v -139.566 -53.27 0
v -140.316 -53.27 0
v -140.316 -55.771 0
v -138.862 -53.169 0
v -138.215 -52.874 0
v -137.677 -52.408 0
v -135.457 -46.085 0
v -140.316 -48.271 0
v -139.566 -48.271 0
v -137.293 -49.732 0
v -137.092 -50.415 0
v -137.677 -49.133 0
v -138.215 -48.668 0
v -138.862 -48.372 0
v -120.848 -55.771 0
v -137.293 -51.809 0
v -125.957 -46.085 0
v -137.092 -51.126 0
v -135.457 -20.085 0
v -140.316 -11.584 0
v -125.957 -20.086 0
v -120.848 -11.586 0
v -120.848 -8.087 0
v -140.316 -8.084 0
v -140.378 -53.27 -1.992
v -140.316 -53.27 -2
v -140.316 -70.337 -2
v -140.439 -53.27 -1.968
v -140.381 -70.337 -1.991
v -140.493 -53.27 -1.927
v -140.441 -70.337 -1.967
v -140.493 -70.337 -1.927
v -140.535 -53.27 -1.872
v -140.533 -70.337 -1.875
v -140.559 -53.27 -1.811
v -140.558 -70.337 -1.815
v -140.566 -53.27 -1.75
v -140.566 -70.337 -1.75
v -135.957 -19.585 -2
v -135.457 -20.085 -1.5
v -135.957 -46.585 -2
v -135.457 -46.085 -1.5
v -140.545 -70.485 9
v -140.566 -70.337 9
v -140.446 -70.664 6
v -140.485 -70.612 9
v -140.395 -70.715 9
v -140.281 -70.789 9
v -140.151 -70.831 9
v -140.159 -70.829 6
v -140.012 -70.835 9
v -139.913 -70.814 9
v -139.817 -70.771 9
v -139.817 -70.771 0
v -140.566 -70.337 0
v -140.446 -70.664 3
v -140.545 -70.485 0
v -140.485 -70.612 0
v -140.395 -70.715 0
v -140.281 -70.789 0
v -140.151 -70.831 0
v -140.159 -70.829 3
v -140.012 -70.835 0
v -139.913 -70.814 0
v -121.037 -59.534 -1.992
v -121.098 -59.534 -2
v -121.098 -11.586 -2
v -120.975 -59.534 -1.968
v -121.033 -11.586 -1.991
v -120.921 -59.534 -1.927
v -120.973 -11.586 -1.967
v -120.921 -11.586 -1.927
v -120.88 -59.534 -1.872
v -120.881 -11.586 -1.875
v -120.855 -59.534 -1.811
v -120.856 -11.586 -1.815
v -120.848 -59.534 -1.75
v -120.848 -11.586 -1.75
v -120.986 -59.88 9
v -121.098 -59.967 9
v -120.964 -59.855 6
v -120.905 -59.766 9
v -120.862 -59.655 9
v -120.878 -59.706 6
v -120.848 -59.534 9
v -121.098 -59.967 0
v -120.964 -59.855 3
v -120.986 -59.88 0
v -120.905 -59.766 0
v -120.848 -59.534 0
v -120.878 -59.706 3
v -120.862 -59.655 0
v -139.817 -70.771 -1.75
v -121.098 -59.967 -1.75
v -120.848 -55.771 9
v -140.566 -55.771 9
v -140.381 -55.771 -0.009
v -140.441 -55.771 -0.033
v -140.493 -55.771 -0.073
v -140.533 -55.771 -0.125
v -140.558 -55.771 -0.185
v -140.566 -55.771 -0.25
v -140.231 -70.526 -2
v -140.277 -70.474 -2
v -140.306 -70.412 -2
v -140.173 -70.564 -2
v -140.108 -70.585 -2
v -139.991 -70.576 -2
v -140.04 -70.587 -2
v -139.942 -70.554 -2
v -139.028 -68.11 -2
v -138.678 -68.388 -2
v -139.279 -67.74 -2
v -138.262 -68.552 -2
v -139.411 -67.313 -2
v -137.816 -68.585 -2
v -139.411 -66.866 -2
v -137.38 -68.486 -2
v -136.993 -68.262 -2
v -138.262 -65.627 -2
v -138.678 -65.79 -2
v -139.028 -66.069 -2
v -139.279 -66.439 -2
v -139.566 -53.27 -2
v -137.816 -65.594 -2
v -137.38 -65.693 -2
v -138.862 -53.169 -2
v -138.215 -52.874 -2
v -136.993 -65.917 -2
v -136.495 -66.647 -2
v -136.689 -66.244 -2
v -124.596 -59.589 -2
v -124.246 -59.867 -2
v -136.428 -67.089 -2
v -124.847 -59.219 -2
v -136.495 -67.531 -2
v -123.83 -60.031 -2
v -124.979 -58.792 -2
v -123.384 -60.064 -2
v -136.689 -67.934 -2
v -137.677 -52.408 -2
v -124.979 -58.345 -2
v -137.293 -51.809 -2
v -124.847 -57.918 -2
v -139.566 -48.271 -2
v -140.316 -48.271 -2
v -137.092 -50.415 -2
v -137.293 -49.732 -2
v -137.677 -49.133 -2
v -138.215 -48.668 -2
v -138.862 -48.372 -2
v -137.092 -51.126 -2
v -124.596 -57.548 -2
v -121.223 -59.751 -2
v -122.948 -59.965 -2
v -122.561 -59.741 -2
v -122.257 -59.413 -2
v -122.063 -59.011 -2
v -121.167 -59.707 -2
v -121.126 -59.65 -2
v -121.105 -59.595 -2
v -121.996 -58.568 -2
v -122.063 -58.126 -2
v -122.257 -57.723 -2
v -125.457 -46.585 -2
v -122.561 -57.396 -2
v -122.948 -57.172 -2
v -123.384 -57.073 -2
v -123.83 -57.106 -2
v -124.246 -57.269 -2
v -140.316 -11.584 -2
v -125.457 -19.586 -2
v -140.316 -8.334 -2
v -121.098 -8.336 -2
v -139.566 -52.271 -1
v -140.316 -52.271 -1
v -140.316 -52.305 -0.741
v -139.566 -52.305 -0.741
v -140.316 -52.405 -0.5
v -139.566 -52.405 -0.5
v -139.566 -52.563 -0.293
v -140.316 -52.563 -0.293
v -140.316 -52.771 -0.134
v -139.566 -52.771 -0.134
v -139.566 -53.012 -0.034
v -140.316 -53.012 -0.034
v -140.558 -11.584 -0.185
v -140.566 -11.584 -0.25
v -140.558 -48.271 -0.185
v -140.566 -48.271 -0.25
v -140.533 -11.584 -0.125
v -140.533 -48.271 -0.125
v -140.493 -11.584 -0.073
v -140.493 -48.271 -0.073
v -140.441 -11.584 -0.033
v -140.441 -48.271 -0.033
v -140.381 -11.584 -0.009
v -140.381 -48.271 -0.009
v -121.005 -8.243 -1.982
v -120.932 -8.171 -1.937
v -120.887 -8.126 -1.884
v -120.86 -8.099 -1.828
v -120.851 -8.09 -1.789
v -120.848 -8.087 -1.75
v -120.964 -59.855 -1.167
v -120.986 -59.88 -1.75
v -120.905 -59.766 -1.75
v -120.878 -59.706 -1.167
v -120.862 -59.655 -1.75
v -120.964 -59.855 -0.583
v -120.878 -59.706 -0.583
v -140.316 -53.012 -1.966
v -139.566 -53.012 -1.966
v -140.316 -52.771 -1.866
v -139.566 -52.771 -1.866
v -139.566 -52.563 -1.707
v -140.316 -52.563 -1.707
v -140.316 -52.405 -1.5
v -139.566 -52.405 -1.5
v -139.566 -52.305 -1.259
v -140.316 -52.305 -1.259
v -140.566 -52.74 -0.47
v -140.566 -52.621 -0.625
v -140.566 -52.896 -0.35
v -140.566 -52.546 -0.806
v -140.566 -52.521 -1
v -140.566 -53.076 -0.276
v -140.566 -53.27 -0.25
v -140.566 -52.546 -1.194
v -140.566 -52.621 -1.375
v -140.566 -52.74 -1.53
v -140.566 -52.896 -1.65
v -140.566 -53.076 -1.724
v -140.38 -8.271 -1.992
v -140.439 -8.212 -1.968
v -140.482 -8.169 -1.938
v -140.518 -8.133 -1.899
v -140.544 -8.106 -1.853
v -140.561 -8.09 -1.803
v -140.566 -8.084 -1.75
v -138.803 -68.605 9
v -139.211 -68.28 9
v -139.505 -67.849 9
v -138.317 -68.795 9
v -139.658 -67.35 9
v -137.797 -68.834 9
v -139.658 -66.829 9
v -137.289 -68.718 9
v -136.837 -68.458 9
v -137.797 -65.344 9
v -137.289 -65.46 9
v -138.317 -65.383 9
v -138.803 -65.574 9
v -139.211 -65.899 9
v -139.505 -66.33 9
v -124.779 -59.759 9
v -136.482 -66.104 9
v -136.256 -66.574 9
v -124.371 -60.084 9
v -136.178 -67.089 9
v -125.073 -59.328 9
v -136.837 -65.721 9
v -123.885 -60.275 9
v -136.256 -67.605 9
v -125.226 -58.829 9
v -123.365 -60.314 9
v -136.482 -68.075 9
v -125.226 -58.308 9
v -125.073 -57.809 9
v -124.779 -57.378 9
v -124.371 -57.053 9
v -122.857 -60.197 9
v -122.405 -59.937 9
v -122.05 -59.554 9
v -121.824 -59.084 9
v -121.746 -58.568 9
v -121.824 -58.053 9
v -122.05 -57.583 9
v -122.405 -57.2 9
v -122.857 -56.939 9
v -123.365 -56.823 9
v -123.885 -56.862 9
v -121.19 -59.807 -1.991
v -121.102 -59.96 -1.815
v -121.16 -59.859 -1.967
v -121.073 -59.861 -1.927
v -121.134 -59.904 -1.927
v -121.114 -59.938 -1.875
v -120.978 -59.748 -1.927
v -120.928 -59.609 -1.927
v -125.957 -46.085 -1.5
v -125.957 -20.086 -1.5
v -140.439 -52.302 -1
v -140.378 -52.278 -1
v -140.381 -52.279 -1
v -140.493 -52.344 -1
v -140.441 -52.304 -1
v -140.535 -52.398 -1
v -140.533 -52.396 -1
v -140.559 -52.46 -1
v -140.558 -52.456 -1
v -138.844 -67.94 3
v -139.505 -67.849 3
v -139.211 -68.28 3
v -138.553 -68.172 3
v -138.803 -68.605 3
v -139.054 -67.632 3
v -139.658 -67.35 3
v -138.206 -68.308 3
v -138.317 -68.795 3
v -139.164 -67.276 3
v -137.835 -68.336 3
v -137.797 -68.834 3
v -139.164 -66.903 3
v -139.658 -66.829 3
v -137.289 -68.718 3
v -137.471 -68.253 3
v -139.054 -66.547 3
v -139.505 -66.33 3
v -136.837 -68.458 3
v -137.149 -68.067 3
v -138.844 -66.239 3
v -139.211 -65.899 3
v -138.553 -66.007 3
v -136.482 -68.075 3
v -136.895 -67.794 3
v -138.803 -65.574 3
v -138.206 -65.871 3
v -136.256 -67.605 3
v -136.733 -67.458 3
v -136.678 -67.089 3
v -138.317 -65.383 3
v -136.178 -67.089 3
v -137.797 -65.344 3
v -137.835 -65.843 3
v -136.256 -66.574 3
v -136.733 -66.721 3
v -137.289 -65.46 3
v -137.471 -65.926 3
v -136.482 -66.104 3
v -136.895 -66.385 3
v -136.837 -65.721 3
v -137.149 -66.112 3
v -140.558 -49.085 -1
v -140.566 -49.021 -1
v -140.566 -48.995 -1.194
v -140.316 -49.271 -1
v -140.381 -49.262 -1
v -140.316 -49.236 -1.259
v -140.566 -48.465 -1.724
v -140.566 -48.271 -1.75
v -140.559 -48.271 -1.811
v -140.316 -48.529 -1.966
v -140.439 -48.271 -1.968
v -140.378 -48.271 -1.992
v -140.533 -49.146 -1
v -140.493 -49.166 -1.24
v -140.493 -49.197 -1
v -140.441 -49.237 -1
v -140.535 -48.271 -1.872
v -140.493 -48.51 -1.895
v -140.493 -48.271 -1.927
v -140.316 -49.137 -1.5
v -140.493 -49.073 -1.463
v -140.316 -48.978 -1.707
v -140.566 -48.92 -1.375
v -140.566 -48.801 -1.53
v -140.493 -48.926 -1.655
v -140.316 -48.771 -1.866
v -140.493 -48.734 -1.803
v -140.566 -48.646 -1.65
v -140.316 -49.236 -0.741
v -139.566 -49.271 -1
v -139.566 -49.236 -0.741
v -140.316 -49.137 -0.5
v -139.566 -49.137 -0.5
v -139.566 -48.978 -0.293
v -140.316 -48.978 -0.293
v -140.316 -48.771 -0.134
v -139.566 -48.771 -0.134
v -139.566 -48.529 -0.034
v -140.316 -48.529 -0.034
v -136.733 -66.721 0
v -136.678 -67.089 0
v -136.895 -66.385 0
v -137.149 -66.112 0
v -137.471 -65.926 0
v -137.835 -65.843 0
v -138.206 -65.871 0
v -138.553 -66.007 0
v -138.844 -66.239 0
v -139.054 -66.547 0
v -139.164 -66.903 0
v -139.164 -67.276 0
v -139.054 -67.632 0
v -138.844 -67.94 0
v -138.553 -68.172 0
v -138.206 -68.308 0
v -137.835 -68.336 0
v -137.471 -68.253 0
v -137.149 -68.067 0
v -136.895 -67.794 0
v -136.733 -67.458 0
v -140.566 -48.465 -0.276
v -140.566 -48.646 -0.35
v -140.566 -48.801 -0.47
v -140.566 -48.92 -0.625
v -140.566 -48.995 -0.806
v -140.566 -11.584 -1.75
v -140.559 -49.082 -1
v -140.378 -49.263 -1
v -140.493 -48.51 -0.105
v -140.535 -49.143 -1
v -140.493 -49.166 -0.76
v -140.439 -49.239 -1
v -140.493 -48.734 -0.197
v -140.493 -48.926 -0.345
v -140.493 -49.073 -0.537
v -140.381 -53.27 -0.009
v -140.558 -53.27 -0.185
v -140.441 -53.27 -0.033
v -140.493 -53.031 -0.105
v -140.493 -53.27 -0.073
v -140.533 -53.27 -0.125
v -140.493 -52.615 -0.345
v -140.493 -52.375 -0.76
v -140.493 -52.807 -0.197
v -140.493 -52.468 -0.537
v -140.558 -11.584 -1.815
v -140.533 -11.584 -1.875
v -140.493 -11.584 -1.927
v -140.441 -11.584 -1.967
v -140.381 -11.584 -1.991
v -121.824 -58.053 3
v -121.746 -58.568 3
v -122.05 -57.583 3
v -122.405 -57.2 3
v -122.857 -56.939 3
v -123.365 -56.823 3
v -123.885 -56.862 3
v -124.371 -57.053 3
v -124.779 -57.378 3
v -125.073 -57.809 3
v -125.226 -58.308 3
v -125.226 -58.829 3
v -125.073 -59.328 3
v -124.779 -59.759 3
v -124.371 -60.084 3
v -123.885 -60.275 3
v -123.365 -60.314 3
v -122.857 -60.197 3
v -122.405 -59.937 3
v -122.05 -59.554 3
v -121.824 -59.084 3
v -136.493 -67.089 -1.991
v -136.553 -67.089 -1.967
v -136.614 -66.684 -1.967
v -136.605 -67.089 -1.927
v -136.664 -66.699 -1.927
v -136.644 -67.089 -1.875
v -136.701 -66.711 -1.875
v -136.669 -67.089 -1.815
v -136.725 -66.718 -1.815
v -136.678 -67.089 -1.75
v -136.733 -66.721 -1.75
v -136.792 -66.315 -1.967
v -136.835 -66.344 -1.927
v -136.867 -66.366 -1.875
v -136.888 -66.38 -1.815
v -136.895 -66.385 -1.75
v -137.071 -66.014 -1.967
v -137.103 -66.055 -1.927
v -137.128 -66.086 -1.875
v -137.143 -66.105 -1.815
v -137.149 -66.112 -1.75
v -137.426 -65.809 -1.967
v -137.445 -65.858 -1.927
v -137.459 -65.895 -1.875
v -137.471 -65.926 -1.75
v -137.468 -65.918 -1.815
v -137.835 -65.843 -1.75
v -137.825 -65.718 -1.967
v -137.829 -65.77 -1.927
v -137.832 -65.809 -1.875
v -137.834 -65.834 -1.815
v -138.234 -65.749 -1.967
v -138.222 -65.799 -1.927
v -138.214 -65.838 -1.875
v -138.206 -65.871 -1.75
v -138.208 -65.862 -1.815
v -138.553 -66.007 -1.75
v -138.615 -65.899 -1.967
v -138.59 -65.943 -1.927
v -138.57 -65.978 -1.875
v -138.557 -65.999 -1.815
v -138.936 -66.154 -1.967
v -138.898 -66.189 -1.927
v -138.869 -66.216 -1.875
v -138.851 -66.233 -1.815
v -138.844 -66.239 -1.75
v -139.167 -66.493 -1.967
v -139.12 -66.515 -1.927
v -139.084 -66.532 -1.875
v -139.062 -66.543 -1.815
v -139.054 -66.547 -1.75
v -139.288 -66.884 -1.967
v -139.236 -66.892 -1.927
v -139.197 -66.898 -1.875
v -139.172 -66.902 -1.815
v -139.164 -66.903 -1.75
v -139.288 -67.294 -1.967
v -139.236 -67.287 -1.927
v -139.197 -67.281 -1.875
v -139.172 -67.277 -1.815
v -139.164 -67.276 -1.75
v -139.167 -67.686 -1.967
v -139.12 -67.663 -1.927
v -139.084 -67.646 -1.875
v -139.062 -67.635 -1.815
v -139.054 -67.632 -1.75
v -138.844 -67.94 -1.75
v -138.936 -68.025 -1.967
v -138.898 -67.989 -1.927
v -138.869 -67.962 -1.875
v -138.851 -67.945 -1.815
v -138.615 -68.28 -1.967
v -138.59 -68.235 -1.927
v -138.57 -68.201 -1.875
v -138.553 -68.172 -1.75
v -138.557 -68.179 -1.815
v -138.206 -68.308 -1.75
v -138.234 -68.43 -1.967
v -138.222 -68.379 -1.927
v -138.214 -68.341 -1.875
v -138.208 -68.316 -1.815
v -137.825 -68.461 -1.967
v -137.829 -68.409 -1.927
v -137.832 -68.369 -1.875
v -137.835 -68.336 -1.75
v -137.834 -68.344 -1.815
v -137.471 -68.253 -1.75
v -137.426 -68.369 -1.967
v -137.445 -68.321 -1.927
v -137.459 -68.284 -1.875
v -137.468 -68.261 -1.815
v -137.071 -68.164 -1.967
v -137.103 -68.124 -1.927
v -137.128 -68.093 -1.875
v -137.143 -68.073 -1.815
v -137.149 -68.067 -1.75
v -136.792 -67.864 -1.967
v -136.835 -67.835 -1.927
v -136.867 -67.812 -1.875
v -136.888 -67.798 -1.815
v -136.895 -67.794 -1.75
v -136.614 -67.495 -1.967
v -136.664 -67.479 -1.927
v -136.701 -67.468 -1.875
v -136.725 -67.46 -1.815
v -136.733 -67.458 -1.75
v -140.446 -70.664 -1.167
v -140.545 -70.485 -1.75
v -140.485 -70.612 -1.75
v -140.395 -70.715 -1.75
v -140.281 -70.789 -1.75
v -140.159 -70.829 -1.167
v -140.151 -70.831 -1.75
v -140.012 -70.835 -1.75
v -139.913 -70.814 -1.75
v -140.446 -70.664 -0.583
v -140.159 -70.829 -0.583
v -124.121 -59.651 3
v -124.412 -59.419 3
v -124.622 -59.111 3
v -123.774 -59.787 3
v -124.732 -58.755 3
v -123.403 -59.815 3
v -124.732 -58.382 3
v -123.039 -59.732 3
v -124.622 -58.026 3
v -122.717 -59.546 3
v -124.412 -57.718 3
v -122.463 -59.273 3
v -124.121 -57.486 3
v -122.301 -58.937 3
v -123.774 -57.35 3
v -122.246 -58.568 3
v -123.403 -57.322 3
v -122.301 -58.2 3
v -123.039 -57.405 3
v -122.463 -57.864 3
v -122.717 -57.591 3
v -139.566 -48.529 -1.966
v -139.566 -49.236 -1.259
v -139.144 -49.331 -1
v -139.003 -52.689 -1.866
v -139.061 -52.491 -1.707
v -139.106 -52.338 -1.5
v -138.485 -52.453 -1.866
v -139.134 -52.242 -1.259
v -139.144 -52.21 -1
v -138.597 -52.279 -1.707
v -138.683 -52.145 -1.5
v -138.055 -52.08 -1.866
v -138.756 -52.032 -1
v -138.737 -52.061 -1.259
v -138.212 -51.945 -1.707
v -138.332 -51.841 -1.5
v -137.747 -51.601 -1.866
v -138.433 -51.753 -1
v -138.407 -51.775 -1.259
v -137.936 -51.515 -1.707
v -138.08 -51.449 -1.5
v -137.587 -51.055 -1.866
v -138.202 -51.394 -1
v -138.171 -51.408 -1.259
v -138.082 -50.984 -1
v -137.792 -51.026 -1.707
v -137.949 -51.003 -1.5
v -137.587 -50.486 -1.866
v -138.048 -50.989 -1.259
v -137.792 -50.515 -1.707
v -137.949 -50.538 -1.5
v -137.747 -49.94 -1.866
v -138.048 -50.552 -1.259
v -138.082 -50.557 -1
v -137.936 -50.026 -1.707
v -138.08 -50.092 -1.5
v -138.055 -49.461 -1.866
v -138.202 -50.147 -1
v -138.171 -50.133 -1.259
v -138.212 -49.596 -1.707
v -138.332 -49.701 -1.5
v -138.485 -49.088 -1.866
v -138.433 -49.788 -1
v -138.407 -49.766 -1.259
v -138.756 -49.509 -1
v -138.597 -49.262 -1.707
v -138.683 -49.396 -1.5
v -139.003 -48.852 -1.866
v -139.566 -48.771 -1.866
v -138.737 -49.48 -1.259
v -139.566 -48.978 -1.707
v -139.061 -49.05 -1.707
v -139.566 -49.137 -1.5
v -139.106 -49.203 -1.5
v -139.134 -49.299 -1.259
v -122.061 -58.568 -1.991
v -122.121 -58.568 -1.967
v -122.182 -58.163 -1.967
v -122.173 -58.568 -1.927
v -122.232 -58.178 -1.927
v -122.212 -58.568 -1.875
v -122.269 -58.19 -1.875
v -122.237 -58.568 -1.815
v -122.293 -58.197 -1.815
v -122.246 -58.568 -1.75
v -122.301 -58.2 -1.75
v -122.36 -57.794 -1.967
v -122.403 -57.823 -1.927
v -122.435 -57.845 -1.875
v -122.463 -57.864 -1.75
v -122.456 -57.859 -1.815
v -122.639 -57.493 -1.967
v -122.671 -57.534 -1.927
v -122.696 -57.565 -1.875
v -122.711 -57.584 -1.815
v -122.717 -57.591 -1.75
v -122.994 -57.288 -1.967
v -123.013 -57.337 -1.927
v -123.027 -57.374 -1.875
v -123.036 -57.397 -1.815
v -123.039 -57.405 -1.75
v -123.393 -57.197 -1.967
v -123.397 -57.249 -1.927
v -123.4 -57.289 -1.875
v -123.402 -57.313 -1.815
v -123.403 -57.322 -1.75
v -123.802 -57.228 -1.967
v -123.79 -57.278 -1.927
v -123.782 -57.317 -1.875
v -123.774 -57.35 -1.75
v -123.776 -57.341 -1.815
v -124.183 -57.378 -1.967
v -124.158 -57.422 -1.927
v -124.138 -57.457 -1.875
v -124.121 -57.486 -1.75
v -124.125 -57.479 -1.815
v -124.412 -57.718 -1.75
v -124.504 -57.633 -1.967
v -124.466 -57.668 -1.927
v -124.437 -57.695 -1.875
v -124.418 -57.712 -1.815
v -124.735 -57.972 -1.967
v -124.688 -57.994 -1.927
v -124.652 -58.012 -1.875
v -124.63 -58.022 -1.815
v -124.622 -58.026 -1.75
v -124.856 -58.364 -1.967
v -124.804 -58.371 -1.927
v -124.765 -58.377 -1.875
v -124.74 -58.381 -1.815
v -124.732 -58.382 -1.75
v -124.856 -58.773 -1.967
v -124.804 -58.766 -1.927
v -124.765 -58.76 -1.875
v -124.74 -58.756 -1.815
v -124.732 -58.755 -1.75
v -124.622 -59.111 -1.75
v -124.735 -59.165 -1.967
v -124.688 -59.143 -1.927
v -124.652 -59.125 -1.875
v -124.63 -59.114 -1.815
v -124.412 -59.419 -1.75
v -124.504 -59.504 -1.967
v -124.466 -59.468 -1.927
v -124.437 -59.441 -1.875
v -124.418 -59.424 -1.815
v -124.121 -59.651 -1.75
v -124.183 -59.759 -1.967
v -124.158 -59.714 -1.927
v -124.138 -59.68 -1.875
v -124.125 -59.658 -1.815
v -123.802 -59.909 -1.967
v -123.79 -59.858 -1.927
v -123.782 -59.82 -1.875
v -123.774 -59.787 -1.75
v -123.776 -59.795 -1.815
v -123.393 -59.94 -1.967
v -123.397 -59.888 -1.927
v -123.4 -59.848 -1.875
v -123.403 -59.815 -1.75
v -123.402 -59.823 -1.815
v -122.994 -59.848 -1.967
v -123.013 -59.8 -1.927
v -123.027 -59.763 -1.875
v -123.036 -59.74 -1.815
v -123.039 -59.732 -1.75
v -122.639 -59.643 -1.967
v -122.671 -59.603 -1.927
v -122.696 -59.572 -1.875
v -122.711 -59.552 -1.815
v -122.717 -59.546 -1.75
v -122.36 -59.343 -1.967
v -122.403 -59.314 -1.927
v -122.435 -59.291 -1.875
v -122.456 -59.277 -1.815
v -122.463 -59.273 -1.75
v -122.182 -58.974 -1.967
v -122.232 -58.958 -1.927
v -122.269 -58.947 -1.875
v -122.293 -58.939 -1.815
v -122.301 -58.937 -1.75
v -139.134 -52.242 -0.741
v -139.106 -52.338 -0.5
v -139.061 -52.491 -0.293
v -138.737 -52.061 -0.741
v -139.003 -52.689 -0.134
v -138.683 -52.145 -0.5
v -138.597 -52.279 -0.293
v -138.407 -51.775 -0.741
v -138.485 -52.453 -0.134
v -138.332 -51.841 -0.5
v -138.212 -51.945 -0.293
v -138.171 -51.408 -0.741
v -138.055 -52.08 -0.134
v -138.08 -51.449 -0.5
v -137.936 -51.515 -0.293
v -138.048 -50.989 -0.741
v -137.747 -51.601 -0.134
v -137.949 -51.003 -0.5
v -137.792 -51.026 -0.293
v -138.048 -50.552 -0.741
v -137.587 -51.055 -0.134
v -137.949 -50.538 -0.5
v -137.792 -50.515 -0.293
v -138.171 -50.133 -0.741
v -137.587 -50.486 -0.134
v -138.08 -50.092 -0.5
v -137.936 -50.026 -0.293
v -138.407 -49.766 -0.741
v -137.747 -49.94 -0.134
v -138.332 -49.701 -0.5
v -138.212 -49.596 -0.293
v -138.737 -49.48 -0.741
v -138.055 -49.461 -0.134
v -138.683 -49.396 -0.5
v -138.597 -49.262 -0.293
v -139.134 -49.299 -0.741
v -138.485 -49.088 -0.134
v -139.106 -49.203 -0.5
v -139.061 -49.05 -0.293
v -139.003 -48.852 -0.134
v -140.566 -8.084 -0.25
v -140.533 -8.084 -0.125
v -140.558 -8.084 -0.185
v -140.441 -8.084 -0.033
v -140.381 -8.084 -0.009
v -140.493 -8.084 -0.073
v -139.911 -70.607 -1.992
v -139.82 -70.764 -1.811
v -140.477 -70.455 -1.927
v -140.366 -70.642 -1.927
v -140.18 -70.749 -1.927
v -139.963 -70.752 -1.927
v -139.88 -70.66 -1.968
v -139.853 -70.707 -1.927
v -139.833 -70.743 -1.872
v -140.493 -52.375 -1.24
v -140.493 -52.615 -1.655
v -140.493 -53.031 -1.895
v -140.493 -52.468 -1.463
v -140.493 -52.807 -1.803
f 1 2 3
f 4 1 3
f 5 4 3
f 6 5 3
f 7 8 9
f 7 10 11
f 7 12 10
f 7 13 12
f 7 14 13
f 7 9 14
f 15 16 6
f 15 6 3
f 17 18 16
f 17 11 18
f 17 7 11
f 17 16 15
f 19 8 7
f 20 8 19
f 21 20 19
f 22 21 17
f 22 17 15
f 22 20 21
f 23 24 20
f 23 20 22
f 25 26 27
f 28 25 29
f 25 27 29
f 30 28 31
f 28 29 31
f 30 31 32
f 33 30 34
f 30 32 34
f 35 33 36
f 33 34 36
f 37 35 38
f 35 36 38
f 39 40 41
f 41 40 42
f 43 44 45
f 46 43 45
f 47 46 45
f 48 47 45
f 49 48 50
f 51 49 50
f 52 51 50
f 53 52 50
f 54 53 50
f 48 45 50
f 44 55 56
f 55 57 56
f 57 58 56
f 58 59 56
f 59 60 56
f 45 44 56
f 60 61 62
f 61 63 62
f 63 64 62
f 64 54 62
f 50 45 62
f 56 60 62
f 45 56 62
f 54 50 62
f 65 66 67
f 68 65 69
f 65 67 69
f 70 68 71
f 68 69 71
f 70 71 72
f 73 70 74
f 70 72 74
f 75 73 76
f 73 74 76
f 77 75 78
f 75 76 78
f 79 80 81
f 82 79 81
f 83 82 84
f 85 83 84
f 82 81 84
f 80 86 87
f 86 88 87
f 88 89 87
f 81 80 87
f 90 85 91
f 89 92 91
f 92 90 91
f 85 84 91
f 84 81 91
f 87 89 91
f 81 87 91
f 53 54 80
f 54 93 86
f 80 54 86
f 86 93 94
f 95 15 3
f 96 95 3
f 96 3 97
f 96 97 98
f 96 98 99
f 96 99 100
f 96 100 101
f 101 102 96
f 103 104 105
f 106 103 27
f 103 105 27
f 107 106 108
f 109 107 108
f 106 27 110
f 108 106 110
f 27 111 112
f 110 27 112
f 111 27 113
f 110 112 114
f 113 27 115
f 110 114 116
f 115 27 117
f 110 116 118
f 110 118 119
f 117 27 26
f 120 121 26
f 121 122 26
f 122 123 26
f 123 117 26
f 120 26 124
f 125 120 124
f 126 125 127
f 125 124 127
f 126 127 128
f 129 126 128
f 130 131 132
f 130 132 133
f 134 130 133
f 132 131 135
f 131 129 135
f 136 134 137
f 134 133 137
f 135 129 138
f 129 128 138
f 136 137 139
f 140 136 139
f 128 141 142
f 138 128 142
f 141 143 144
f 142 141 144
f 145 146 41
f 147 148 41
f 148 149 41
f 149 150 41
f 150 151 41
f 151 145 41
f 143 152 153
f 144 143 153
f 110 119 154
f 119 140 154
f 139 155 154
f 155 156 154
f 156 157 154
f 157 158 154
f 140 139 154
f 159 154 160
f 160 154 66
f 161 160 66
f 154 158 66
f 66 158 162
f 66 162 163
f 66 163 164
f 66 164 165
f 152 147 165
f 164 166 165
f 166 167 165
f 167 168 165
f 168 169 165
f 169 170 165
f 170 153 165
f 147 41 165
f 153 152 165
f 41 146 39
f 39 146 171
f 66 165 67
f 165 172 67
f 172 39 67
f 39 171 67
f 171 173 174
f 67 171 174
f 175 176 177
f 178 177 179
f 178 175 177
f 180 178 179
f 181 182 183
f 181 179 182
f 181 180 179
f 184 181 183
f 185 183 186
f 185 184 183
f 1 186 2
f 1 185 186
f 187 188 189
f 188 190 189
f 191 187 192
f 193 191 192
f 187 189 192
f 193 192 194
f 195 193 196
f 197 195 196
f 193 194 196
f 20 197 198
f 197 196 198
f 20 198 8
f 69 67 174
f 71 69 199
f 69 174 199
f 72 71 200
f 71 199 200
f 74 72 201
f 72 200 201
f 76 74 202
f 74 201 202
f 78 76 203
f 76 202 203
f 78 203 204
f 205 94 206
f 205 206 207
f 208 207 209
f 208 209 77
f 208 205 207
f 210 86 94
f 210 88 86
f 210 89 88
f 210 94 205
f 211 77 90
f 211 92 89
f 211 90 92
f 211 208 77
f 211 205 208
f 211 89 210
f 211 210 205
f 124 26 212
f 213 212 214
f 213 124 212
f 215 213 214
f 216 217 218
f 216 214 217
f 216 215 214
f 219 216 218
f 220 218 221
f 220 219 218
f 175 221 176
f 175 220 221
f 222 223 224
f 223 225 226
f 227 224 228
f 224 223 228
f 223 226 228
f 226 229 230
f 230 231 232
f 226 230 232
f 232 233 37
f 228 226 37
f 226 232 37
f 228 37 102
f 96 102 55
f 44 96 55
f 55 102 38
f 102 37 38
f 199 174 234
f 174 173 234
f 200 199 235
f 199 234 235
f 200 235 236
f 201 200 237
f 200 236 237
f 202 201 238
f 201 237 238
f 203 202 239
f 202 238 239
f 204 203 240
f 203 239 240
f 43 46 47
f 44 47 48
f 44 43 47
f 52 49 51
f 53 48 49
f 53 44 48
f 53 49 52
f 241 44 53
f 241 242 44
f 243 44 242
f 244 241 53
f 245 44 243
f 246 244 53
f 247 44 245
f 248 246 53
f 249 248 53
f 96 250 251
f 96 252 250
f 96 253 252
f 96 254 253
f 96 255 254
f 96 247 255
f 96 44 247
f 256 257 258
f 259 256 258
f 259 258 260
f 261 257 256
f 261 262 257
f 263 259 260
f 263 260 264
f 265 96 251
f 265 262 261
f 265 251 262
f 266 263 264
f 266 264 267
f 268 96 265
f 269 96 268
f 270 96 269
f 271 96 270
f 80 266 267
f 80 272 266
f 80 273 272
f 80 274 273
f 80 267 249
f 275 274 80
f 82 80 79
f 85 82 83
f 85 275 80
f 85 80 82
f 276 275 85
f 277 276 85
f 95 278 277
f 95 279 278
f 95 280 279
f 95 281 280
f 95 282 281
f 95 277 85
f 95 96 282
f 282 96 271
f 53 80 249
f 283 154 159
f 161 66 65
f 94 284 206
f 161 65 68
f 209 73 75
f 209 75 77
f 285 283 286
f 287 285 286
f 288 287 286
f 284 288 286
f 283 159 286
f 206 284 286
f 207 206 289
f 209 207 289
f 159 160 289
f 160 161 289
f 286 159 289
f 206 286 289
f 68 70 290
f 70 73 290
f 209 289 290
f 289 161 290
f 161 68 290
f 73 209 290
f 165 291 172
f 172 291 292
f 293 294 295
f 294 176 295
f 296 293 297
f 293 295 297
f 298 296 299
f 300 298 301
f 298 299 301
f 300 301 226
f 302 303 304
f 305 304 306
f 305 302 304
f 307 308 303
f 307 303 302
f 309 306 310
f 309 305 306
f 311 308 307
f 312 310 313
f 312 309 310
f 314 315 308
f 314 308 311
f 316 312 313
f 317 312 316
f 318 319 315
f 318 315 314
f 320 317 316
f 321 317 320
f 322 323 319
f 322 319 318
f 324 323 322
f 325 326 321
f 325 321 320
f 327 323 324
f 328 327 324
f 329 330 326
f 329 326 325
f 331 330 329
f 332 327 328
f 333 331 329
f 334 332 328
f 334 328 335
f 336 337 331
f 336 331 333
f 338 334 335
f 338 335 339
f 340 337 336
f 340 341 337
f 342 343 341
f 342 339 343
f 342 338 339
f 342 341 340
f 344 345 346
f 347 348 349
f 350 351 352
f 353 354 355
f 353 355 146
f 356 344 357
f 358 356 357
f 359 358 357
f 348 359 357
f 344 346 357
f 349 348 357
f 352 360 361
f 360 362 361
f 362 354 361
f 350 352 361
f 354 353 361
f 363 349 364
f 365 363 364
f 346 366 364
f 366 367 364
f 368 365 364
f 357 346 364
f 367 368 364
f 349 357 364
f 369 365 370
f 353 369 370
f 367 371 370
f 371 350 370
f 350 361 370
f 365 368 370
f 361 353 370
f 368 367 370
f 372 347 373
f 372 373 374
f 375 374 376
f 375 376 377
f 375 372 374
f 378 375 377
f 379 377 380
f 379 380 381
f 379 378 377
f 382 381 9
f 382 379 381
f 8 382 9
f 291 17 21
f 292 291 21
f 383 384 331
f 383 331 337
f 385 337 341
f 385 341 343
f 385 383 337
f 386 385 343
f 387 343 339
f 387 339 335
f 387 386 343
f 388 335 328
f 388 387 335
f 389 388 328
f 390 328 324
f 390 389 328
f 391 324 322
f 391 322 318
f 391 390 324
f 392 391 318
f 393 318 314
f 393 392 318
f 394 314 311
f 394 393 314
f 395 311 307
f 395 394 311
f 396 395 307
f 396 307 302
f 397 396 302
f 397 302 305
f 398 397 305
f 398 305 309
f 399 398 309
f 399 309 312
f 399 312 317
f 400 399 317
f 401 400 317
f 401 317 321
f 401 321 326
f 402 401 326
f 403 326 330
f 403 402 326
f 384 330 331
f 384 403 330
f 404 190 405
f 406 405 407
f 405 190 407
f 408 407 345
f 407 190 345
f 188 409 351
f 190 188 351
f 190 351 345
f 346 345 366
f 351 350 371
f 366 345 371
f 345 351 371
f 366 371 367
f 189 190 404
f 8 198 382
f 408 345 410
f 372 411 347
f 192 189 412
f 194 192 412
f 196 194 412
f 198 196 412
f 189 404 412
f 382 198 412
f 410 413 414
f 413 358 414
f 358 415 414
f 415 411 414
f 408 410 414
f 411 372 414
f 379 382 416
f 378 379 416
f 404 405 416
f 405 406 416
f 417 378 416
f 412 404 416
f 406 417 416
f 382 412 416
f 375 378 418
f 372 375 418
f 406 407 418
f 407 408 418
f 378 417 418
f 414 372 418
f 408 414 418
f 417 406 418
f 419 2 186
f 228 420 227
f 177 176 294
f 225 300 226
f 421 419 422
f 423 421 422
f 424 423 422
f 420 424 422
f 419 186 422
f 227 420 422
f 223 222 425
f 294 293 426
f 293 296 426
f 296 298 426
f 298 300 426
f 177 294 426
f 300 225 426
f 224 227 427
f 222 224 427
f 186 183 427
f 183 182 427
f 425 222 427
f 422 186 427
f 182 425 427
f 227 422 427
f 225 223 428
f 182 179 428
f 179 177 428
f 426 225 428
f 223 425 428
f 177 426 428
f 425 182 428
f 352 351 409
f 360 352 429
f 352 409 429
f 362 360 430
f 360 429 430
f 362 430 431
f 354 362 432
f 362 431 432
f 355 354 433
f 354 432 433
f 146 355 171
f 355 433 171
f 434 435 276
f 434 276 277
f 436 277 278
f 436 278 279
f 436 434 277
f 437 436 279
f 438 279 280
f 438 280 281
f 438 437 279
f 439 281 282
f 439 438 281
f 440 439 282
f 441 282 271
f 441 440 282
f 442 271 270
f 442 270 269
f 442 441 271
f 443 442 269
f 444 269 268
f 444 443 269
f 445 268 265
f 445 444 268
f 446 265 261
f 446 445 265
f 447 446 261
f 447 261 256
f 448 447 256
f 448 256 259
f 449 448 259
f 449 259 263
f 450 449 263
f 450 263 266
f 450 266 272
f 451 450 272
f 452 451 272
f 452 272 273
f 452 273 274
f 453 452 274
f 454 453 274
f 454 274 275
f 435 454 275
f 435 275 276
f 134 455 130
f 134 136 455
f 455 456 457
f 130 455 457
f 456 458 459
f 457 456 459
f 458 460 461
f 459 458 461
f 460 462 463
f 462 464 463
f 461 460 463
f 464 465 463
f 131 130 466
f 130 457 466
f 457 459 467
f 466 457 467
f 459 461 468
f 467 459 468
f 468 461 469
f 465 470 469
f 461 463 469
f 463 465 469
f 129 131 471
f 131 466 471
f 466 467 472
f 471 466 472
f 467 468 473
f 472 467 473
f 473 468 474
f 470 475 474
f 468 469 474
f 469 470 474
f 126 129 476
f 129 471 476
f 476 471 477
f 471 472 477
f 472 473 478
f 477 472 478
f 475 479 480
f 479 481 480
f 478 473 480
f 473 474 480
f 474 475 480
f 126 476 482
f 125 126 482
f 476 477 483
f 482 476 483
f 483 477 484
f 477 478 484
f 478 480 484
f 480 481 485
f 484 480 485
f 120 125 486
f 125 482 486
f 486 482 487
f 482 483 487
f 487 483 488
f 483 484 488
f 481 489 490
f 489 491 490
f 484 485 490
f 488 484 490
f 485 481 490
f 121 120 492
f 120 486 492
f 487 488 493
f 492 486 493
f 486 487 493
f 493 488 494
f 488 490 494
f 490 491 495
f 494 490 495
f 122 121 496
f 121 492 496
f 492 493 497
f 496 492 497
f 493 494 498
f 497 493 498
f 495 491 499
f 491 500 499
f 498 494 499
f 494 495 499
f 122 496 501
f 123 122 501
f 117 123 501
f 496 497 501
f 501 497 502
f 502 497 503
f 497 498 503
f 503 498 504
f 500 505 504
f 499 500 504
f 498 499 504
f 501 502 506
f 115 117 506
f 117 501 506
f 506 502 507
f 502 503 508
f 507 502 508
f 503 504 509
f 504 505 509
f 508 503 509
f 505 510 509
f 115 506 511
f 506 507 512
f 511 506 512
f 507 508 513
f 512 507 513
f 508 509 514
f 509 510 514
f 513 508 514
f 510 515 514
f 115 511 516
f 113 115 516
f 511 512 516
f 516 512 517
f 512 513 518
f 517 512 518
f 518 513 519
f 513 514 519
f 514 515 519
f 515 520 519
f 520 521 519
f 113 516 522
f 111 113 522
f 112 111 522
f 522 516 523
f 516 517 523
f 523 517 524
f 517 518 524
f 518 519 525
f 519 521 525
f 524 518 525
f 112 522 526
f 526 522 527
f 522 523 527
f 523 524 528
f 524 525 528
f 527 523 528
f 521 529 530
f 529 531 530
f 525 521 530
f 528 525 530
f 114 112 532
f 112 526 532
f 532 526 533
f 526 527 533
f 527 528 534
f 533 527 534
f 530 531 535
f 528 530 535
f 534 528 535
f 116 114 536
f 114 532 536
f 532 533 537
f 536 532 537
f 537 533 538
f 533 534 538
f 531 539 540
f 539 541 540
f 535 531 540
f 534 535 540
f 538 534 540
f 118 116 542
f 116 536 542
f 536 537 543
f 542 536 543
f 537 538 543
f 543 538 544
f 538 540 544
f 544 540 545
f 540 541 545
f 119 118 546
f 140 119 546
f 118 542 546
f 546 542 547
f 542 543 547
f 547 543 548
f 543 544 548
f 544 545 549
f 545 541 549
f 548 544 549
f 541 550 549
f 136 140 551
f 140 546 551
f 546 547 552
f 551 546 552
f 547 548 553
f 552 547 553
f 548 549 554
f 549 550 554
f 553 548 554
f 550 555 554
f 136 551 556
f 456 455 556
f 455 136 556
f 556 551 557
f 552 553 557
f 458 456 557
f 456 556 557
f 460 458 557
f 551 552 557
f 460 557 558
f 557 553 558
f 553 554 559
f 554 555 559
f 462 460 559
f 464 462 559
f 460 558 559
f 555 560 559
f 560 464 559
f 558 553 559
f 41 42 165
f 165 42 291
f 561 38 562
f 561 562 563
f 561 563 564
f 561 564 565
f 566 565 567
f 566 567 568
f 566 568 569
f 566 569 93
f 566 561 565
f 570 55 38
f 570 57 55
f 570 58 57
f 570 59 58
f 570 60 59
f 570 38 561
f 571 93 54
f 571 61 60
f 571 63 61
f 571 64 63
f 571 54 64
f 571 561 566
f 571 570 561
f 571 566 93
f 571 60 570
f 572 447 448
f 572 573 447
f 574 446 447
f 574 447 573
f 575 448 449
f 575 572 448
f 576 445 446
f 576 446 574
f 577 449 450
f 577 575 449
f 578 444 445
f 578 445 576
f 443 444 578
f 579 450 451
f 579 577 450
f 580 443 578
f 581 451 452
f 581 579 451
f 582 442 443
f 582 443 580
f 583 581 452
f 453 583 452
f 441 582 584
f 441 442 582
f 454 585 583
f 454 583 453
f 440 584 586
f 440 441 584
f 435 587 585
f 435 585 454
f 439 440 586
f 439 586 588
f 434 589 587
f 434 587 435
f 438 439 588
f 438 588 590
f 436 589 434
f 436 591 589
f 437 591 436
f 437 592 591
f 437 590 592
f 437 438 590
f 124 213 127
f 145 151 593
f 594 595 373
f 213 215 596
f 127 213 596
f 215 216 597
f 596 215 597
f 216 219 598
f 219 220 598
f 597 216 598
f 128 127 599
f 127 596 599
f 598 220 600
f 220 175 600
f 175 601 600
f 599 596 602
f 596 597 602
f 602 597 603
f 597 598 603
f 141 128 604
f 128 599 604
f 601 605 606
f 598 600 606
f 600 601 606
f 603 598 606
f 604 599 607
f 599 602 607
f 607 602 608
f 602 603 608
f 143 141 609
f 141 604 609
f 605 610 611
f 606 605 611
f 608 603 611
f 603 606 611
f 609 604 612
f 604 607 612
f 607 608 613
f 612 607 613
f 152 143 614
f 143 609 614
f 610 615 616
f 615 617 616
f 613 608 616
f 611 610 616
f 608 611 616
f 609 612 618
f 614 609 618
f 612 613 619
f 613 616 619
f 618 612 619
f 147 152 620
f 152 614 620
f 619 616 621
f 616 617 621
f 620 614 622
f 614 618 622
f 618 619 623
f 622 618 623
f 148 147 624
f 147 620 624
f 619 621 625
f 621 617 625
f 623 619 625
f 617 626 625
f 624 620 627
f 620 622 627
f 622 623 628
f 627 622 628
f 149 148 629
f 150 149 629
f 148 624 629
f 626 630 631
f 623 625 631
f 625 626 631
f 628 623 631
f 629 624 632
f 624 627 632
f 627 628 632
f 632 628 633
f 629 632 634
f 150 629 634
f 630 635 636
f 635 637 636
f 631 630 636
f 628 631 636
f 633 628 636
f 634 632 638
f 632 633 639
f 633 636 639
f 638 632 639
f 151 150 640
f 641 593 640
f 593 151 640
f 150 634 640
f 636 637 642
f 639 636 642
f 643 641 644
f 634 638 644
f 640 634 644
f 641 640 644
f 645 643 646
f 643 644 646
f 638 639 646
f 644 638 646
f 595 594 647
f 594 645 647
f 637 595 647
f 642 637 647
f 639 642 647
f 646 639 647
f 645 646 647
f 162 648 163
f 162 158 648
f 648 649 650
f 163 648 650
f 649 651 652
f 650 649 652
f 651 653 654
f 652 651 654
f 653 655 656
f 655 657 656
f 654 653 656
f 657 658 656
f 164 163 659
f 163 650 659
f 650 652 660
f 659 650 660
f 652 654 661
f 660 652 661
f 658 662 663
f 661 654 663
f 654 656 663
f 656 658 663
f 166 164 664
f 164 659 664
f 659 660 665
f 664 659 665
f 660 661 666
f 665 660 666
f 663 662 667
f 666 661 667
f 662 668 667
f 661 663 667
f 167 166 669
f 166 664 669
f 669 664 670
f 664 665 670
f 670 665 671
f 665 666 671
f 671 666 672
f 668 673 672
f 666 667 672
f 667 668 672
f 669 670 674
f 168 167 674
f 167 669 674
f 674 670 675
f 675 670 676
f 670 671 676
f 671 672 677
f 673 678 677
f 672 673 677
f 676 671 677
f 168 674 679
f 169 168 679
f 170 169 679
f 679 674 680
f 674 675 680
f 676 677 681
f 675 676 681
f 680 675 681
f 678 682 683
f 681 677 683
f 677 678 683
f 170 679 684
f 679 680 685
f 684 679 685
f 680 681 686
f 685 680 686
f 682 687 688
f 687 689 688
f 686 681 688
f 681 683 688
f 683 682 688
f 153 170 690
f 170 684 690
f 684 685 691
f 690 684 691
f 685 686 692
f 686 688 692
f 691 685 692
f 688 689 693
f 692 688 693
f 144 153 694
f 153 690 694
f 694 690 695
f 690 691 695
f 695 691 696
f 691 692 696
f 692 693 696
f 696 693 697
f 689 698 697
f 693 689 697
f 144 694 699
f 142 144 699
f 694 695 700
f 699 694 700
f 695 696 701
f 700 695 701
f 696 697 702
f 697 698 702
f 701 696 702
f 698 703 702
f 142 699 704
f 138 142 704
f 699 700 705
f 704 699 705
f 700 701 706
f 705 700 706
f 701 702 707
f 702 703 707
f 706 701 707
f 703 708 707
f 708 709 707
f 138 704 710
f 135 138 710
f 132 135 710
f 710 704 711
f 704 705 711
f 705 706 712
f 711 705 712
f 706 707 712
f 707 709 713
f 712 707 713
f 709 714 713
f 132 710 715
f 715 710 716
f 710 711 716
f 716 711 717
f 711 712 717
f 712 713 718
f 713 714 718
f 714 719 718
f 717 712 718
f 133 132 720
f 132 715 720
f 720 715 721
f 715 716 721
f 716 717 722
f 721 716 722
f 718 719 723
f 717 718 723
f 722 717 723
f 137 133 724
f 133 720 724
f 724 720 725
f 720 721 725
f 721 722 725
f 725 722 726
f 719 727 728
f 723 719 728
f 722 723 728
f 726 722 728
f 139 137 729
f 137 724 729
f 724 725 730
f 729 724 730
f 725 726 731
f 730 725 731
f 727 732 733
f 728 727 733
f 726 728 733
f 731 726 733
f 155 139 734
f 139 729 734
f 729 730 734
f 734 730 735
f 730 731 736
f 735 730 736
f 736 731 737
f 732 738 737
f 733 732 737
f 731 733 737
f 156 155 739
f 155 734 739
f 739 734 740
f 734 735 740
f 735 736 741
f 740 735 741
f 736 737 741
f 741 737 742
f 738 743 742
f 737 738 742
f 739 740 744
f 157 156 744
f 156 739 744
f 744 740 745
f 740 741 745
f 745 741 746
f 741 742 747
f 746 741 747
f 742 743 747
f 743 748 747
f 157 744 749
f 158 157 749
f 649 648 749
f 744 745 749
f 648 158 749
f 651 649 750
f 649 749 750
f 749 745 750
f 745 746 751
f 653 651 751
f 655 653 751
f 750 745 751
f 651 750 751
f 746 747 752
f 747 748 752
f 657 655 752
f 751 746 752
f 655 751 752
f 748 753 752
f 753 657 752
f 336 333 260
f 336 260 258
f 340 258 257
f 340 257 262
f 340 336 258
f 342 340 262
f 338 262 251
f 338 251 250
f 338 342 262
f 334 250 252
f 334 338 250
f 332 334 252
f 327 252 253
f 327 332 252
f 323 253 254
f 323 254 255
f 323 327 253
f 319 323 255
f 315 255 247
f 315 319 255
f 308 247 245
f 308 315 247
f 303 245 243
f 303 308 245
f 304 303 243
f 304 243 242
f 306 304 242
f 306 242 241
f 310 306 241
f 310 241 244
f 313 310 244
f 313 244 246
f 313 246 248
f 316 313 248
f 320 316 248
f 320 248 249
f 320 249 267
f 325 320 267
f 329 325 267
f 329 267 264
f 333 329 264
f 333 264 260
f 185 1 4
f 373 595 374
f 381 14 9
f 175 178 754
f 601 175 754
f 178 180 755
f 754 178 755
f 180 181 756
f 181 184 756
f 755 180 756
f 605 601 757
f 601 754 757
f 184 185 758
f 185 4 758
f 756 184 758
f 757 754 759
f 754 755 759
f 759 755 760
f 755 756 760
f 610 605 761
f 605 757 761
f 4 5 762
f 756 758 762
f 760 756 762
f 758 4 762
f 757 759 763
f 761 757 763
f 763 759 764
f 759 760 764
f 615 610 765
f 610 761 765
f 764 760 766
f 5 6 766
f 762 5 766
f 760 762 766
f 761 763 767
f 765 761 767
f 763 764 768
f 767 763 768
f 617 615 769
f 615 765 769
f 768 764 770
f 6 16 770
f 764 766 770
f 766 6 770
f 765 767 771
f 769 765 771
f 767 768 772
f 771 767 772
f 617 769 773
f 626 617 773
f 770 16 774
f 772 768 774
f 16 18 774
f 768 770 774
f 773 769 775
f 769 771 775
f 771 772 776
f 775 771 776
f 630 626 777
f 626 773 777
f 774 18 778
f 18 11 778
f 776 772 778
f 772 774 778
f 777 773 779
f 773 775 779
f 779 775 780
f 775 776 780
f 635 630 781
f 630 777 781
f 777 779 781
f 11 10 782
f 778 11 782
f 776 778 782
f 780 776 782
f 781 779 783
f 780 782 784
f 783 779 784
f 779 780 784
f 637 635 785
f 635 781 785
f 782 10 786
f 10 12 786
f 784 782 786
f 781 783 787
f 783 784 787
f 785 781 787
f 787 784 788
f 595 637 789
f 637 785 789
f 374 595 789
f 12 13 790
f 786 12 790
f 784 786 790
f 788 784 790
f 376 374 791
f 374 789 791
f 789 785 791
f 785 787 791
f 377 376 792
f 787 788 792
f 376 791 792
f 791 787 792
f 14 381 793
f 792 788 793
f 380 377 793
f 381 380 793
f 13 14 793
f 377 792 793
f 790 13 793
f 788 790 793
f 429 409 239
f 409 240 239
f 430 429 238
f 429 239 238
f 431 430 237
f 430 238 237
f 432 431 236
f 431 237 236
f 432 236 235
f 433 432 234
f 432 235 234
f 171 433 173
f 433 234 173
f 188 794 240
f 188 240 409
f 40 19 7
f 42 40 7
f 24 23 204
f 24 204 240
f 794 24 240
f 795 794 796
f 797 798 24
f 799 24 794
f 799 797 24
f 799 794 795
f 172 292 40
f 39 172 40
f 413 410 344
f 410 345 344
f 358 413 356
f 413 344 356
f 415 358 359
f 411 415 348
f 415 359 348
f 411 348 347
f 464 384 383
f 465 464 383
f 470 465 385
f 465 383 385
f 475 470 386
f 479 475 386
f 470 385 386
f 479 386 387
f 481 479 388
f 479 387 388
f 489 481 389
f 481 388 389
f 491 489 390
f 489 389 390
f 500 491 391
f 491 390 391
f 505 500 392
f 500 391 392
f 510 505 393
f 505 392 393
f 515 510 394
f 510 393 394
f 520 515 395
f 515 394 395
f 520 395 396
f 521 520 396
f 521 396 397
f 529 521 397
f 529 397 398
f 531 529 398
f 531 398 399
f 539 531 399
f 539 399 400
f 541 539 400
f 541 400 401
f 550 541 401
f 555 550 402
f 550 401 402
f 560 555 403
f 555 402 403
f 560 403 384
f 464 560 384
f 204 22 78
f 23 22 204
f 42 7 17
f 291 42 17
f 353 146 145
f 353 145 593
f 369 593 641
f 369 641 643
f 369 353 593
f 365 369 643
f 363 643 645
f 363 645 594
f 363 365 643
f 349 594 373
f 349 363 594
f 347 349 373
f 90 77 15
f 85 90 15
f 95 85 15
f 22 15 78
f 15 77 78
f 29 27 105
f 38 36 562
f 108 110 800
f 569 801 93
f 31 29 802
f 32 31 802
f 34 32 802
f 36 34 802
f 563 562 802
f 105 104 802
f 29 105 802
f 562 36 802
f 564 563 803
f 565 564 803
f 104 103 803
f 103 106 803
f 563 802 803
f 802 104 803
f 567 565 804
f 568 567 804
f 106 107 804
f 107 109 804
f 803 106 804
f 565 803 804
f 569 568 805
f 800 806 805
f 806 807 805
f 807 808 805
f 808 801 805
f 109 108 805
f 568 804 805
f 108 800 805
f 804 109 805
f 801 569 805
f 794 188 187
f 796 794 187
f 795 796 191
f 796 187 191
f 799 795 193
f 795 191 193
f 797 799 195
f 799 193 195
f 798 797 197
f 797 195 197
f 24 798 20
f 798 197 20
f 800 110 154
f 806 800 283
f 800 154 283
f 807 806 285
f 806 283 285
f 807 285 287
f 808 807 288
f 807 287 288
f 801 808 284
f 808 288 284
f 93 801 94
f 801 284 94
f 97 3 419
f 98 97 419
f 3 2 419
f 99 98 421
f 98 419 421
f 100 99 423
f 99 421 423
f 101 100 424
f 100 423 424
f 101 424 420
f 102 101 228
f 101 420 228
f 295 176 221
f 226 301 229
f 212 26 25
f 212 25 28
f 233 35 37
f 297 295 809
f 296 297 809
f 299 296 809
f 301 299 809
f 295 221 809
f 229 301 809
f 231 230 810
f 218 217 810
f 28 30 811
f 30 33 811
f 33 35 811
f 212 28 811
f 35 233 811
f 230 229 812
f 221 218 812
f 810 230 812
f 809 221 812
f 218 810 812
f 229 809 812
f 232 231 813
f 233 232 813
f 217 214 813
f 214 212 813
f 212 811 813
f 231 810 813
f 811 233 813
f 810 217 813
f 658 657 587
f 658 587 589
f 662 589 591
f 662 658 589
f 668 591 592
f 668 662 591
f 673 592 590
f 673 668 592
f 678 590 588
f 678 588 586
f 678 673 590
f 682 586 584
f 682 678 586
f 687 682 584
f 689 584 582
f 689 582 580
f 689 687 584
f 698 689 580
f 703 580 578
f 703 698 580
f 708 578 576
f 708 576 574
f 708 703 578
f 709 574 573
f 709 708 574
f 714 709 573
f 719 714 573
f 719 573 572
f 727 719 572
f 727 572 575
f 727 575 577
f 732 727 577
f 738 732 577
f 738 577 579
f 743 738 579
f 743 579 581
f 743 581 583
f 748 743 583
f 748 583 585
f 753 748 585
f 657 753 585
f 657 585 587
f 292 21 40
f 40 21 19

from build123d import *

# Parameters (mm, degrees)
SKETCH4_R               = 1.2500000000000113
SKETCH4_R_2             = 1.2499999999999978
BOSS_EXTRUDE4_DEPTH     = 2
SKETCH4_5_R             = 1.7500000000000104
SKETCH4_5_R_2           = 1.749999999999997
BOSS_EXTRUDE5_DEPTH     = 9
SKETCH4_6_R             = 1.749999999999997
SKETCH4_6_R_2           = 1.2499999999999978
SKETCH4_6_R_3           = 1.7500000000000104
SKETCH4_6_R_4           = 1.2500000000000113
BOSS_EXTRUDE6_DEPTH     = 3
CUT_EXTRUDE1_DEPTH      = 158.79099158717955
CUT_EXTRUDE1_DEPTH_BACK = 158.79099158717955
FILLET1_R               = 1
FILLET2_R               = 0.25
CUT_EXTRUDE2_DEPTH      = 158.79099158717955
CUT_EXTRUDE2_DEPTH_BACK = 158.79099158717955
CHAMFER1_SIZE           = 0.5


with BuildPart() as part:
    # Sketch4 → Boss-Extrude4 (new body)
    with BuildSketch(Plane.XY):
        with BuildLine():
            add(Edge.make_bspline(
                [(-121.0977219670568, -59.96744638283075), (-120.94298009720131, -59.87814106550356), (-120.8476486211035, -59.71305439455445), (-120.8476486210958, -59.53439134300407)],
                knots=[3, 3, 3, 3, 4, 4, 4, 4], degree=3))
            Line((-120.8476486210958, -59.53439134300407), (-120.8476486189429, -11.586453102615721))
            Line((-120.8476486189429, -11.58645310261572), (-120.8476486189429, -8.0865191630969))
            Line((-120.8476486189429, -8.0865191630969), (-140.5664979509455, -8.083912687906277))
            Line((-140.5664979509455, -8.083912687906277), (-140.5664979509455, -11.58397880929067))
            Line((-140.5664979509455, -11.58397880929067), (-140.5664979535839, -70.33749706476789))
            add(Edge.make_bspline(
                [(-140.5664979535839, -70.33749706476789), (-140.5664979536002, -70.72235960570497), (-140.1499046258814, -70.96292691883274), (-139.8165712997942, -70.7705521046382)],
                knots=[1, 1, 1, 1, 2, 2, 2, 2], degree=3))
            Line((-139.8165712997942, -70.7705521046382), (-121.0977219670568, -59.96744638283075))
        make_face()
        with Locations((-137.92794657478115, -67.08936245467149)):
            Circle(SKETCH4_R, mode=Mode.SUBTRACT)
        with Locations((-123.49593879557014, -58.568434854590414)):
            Circle(SKETCH4_R_2, mode=Mode.SUBTRACT)
    extrude(amount=-BOSS_EXTRUDE4_DEPTH)

    # Sketch4<5> → Boss-Extrude5 (add)
    # profile 1 of 2: a face of its own
    with BuildSketch(Plane.XY):
        Polygon((-140.56649795336358, -65.4304148764118), (-123.8285782795111, -55.7705521046382), (-140.56649795292978, -55.7705521046382), align=None)
    # profile 2 of 2: a face of its own
    with BuildSketch(Plane.XY):
        with BuildLine():
            add(Edge.make_bspline(
                [(-121.0977219670568, -59.96744638283075), (-120.94298009720131, -59.87814106550356), (-120.8476486211035, -59.71305439455445), (-120.8476486210958, -59.53439134300407)],
                knots=[3, 3, 3, 3, 4, 4, 4, 4], degree=3))
            Line((-120.8476486210958, -59.53439134300407), (-120.8476486209268, -55.7705521046382))
            Line((-120.84764862092679, -55.7705521046382), (-123.8285782795111, -55.7705521046382))
            Line((-123.8285782795111, -55.7705521046382), (-140.56649795336358, -65.4304148764118))
            Line((-140.56649795336355, -65.4304148764118), (-140.5664979535839, -70.33749706476789))
            add(Edge.make_bspline(
                [(-140.5664979535839, -70.33749706476789), (-140.5664979536002, -70.72235960570497), (-140.1499046258814, -70.96292691883274), (-139.8165712997942, -70.7705521046382)],
                knots=[1, 1, 1, 1, 2, 2, 2, 2], degree=3))
            Line((-139.8165712997942, -70.7705521046382), (-121.0977219670568, -59.96744638283075))
        make_face()
        with Locations((-137.92794657478115, -67.08936245467149)):
            Circle(SKETCH4_5_R, mode=Mode.SUBTRACT)
        with Locations((-123.49593879557014, -58.568434854590414)):
            Circle(SKETCH4_5_R_2, mode=Mode.SUBTRACT)
    extrude(amount=BOSS_EXTRUDE5_DEPTH)

    # Sketch4<6> → Boss-Extrude6 (add)
    # profile 1 of 2: a face of its own
    with BuildSketch(Plane.XY):
        with Locations((-123.49593879557014, -58.568434854590414)):
            Circle(SKETCH4_6_R)
        with Locations((-123.49593879557014, -58.568434854590414)):
            Circle(SKETCH4_6_R_2, mode=Mode.SUBTRACT)
    # profile 2 of 2: a face of its own
    with BuildSketch(Plane.XY):
        with Locations((-137.92794657478115, -67.08936245467149)):
            Circle(SKETCH4_6_R_3)
        with Locations((-137.92794657478115, -67.08936245467149)):
            Circle(SKETCH4_6_R_4, mode=Mode.SUBTRACT)
    extrude(amount=BOSS_EXTRUDE6_DEPTH)

    # Sketch8 → Cut-Extrude1 (cut, two sides: drawn at the far end of the back side and taken through both)
    with BuildSketch(Plane(origin=(0, 0, -2), x_dir=(-1, 0, 0), z_dir=(0, 0, -1)).offset(-CUT_EXTRUDE1_DEPTH_BACK)):
        with BuildLine():
            Line((139.5664979509455, -49.27055210463822), (143.2884320777397, -49.27055210463822))
            Line((143.2884320777397, -49.27055210463822), (143.2884320777397, -52.270552104638206))
            Line((143.2884320777397, -52.270552104638206), (139.5664979509455, -52.270552104638206))
            ThreePointArc((139.5664979509455, -52.270552104638206), (138.0664979509455, -50.77055210463821), (139.5664979509455, -49.27055210463822))
        make_face()
    extrude(amount=CUT_EXTRUDE1_DEPTH + CUT_EXTRUDE1_DEPTH_BACK, mode=Mode.SUBTRACT)

    # Fillet1
    fillet1_edges = [part.edges().sort_by_distance(p)[0] for p in [
        (-140.06649795193763, -52.270552104638206, 0),
        (-140.06649795227284, -52.270552104638206, -2),
        (-140.06649795193763, -49.27055210463822, 0),
        (-140.06649795227284, -49.27055210463822, -2),
        (-138.0664979509455, -50.77055210463821, 0),
        (-138.0664979509455, -50.77055210463821, -2),
    ]]
    fillet(fillet1_edges, radius=FILLET1_R - 0.0001)  # a hair under: the kernel refuses the full size

    # Fillet2
    fillet2_edges = [part.edges().sort_by_distance(p)[0] for p in [
        (-140.56649795176924, -29.927315456964447, 0),
        (-140.31653462082718, -70.7704885946968, -2),
        (-130.4571466334255, -65.36899924373448, -2),
        (-120.91465709288339, -59.78442801325112, -2),
        (-120.84764862001936, -35.56042222280989, -2),
        (-130.7070732849442, -8.08521592550159, -2),
        (-124.74593879557014, -58.568434854590414, -2),
        (-139.17794657478115, -67.08936245467149, -2),
        (-140.56649795176924, -29.927315456964447, -2),
        (-140.56649795287362, -54.5205021046382, 0),
        (-140.5664979532007, -61.80397458470304, -2),
        (-140.56649795281749, -52.56341603412977, -1.707136070508429),
        (-140.56649795281749, -52.56341603412977, -0.29286392949157103),
        (-140.56649795259295, -48.97768817514665, -1.707136070508429),
        (-140.56649795259295, -48.97768817514665, -0.2928639294915709),
    ]]
    fillet(fillet2_edges, radius=FILLET2_R)

    # Sketch9 → Cut-Extrude2 (cut, two sides: drawn at the far end of the back side and taken through both)
    with BuildSketch(Plane(origin=(0, 0, -2), x_dir=(-1, 0, 0), z_dir=(0, 0, -1)).offset(-CUT_EXTRUDE2_DEPTH_BACK)):
        Polygon((125.95707332644032, -20.085843894406473), (135.45707324344806, -20.084588166261394), (135.45707324344806, -46.08458816626139), (125.95707332644032, -46.08458816626139), align=None)
    extrude(amount=CUT_EXTRUDE2_DEPTH + CUT_EXTRUDE2_DEPTH_BACK, mode=Mode.SUBTRACT)

    # Chamfer1
    chamfer1_edges = [part.edges().sort_by_distance(p)[0] for p in [
        (-125.95707332644032, -33.08521603033393, -2),
        (-130.7070732849442, -20.08521603033393, -2),
        (-135.45707324344806, -33.08458816626139, -2),
        (-130.7070732849442, -46.08458816626139, -2),
    ]]
    chamfer(chamfer1_edges, length=CHAMFER1_SIZE)


solid = part.part
